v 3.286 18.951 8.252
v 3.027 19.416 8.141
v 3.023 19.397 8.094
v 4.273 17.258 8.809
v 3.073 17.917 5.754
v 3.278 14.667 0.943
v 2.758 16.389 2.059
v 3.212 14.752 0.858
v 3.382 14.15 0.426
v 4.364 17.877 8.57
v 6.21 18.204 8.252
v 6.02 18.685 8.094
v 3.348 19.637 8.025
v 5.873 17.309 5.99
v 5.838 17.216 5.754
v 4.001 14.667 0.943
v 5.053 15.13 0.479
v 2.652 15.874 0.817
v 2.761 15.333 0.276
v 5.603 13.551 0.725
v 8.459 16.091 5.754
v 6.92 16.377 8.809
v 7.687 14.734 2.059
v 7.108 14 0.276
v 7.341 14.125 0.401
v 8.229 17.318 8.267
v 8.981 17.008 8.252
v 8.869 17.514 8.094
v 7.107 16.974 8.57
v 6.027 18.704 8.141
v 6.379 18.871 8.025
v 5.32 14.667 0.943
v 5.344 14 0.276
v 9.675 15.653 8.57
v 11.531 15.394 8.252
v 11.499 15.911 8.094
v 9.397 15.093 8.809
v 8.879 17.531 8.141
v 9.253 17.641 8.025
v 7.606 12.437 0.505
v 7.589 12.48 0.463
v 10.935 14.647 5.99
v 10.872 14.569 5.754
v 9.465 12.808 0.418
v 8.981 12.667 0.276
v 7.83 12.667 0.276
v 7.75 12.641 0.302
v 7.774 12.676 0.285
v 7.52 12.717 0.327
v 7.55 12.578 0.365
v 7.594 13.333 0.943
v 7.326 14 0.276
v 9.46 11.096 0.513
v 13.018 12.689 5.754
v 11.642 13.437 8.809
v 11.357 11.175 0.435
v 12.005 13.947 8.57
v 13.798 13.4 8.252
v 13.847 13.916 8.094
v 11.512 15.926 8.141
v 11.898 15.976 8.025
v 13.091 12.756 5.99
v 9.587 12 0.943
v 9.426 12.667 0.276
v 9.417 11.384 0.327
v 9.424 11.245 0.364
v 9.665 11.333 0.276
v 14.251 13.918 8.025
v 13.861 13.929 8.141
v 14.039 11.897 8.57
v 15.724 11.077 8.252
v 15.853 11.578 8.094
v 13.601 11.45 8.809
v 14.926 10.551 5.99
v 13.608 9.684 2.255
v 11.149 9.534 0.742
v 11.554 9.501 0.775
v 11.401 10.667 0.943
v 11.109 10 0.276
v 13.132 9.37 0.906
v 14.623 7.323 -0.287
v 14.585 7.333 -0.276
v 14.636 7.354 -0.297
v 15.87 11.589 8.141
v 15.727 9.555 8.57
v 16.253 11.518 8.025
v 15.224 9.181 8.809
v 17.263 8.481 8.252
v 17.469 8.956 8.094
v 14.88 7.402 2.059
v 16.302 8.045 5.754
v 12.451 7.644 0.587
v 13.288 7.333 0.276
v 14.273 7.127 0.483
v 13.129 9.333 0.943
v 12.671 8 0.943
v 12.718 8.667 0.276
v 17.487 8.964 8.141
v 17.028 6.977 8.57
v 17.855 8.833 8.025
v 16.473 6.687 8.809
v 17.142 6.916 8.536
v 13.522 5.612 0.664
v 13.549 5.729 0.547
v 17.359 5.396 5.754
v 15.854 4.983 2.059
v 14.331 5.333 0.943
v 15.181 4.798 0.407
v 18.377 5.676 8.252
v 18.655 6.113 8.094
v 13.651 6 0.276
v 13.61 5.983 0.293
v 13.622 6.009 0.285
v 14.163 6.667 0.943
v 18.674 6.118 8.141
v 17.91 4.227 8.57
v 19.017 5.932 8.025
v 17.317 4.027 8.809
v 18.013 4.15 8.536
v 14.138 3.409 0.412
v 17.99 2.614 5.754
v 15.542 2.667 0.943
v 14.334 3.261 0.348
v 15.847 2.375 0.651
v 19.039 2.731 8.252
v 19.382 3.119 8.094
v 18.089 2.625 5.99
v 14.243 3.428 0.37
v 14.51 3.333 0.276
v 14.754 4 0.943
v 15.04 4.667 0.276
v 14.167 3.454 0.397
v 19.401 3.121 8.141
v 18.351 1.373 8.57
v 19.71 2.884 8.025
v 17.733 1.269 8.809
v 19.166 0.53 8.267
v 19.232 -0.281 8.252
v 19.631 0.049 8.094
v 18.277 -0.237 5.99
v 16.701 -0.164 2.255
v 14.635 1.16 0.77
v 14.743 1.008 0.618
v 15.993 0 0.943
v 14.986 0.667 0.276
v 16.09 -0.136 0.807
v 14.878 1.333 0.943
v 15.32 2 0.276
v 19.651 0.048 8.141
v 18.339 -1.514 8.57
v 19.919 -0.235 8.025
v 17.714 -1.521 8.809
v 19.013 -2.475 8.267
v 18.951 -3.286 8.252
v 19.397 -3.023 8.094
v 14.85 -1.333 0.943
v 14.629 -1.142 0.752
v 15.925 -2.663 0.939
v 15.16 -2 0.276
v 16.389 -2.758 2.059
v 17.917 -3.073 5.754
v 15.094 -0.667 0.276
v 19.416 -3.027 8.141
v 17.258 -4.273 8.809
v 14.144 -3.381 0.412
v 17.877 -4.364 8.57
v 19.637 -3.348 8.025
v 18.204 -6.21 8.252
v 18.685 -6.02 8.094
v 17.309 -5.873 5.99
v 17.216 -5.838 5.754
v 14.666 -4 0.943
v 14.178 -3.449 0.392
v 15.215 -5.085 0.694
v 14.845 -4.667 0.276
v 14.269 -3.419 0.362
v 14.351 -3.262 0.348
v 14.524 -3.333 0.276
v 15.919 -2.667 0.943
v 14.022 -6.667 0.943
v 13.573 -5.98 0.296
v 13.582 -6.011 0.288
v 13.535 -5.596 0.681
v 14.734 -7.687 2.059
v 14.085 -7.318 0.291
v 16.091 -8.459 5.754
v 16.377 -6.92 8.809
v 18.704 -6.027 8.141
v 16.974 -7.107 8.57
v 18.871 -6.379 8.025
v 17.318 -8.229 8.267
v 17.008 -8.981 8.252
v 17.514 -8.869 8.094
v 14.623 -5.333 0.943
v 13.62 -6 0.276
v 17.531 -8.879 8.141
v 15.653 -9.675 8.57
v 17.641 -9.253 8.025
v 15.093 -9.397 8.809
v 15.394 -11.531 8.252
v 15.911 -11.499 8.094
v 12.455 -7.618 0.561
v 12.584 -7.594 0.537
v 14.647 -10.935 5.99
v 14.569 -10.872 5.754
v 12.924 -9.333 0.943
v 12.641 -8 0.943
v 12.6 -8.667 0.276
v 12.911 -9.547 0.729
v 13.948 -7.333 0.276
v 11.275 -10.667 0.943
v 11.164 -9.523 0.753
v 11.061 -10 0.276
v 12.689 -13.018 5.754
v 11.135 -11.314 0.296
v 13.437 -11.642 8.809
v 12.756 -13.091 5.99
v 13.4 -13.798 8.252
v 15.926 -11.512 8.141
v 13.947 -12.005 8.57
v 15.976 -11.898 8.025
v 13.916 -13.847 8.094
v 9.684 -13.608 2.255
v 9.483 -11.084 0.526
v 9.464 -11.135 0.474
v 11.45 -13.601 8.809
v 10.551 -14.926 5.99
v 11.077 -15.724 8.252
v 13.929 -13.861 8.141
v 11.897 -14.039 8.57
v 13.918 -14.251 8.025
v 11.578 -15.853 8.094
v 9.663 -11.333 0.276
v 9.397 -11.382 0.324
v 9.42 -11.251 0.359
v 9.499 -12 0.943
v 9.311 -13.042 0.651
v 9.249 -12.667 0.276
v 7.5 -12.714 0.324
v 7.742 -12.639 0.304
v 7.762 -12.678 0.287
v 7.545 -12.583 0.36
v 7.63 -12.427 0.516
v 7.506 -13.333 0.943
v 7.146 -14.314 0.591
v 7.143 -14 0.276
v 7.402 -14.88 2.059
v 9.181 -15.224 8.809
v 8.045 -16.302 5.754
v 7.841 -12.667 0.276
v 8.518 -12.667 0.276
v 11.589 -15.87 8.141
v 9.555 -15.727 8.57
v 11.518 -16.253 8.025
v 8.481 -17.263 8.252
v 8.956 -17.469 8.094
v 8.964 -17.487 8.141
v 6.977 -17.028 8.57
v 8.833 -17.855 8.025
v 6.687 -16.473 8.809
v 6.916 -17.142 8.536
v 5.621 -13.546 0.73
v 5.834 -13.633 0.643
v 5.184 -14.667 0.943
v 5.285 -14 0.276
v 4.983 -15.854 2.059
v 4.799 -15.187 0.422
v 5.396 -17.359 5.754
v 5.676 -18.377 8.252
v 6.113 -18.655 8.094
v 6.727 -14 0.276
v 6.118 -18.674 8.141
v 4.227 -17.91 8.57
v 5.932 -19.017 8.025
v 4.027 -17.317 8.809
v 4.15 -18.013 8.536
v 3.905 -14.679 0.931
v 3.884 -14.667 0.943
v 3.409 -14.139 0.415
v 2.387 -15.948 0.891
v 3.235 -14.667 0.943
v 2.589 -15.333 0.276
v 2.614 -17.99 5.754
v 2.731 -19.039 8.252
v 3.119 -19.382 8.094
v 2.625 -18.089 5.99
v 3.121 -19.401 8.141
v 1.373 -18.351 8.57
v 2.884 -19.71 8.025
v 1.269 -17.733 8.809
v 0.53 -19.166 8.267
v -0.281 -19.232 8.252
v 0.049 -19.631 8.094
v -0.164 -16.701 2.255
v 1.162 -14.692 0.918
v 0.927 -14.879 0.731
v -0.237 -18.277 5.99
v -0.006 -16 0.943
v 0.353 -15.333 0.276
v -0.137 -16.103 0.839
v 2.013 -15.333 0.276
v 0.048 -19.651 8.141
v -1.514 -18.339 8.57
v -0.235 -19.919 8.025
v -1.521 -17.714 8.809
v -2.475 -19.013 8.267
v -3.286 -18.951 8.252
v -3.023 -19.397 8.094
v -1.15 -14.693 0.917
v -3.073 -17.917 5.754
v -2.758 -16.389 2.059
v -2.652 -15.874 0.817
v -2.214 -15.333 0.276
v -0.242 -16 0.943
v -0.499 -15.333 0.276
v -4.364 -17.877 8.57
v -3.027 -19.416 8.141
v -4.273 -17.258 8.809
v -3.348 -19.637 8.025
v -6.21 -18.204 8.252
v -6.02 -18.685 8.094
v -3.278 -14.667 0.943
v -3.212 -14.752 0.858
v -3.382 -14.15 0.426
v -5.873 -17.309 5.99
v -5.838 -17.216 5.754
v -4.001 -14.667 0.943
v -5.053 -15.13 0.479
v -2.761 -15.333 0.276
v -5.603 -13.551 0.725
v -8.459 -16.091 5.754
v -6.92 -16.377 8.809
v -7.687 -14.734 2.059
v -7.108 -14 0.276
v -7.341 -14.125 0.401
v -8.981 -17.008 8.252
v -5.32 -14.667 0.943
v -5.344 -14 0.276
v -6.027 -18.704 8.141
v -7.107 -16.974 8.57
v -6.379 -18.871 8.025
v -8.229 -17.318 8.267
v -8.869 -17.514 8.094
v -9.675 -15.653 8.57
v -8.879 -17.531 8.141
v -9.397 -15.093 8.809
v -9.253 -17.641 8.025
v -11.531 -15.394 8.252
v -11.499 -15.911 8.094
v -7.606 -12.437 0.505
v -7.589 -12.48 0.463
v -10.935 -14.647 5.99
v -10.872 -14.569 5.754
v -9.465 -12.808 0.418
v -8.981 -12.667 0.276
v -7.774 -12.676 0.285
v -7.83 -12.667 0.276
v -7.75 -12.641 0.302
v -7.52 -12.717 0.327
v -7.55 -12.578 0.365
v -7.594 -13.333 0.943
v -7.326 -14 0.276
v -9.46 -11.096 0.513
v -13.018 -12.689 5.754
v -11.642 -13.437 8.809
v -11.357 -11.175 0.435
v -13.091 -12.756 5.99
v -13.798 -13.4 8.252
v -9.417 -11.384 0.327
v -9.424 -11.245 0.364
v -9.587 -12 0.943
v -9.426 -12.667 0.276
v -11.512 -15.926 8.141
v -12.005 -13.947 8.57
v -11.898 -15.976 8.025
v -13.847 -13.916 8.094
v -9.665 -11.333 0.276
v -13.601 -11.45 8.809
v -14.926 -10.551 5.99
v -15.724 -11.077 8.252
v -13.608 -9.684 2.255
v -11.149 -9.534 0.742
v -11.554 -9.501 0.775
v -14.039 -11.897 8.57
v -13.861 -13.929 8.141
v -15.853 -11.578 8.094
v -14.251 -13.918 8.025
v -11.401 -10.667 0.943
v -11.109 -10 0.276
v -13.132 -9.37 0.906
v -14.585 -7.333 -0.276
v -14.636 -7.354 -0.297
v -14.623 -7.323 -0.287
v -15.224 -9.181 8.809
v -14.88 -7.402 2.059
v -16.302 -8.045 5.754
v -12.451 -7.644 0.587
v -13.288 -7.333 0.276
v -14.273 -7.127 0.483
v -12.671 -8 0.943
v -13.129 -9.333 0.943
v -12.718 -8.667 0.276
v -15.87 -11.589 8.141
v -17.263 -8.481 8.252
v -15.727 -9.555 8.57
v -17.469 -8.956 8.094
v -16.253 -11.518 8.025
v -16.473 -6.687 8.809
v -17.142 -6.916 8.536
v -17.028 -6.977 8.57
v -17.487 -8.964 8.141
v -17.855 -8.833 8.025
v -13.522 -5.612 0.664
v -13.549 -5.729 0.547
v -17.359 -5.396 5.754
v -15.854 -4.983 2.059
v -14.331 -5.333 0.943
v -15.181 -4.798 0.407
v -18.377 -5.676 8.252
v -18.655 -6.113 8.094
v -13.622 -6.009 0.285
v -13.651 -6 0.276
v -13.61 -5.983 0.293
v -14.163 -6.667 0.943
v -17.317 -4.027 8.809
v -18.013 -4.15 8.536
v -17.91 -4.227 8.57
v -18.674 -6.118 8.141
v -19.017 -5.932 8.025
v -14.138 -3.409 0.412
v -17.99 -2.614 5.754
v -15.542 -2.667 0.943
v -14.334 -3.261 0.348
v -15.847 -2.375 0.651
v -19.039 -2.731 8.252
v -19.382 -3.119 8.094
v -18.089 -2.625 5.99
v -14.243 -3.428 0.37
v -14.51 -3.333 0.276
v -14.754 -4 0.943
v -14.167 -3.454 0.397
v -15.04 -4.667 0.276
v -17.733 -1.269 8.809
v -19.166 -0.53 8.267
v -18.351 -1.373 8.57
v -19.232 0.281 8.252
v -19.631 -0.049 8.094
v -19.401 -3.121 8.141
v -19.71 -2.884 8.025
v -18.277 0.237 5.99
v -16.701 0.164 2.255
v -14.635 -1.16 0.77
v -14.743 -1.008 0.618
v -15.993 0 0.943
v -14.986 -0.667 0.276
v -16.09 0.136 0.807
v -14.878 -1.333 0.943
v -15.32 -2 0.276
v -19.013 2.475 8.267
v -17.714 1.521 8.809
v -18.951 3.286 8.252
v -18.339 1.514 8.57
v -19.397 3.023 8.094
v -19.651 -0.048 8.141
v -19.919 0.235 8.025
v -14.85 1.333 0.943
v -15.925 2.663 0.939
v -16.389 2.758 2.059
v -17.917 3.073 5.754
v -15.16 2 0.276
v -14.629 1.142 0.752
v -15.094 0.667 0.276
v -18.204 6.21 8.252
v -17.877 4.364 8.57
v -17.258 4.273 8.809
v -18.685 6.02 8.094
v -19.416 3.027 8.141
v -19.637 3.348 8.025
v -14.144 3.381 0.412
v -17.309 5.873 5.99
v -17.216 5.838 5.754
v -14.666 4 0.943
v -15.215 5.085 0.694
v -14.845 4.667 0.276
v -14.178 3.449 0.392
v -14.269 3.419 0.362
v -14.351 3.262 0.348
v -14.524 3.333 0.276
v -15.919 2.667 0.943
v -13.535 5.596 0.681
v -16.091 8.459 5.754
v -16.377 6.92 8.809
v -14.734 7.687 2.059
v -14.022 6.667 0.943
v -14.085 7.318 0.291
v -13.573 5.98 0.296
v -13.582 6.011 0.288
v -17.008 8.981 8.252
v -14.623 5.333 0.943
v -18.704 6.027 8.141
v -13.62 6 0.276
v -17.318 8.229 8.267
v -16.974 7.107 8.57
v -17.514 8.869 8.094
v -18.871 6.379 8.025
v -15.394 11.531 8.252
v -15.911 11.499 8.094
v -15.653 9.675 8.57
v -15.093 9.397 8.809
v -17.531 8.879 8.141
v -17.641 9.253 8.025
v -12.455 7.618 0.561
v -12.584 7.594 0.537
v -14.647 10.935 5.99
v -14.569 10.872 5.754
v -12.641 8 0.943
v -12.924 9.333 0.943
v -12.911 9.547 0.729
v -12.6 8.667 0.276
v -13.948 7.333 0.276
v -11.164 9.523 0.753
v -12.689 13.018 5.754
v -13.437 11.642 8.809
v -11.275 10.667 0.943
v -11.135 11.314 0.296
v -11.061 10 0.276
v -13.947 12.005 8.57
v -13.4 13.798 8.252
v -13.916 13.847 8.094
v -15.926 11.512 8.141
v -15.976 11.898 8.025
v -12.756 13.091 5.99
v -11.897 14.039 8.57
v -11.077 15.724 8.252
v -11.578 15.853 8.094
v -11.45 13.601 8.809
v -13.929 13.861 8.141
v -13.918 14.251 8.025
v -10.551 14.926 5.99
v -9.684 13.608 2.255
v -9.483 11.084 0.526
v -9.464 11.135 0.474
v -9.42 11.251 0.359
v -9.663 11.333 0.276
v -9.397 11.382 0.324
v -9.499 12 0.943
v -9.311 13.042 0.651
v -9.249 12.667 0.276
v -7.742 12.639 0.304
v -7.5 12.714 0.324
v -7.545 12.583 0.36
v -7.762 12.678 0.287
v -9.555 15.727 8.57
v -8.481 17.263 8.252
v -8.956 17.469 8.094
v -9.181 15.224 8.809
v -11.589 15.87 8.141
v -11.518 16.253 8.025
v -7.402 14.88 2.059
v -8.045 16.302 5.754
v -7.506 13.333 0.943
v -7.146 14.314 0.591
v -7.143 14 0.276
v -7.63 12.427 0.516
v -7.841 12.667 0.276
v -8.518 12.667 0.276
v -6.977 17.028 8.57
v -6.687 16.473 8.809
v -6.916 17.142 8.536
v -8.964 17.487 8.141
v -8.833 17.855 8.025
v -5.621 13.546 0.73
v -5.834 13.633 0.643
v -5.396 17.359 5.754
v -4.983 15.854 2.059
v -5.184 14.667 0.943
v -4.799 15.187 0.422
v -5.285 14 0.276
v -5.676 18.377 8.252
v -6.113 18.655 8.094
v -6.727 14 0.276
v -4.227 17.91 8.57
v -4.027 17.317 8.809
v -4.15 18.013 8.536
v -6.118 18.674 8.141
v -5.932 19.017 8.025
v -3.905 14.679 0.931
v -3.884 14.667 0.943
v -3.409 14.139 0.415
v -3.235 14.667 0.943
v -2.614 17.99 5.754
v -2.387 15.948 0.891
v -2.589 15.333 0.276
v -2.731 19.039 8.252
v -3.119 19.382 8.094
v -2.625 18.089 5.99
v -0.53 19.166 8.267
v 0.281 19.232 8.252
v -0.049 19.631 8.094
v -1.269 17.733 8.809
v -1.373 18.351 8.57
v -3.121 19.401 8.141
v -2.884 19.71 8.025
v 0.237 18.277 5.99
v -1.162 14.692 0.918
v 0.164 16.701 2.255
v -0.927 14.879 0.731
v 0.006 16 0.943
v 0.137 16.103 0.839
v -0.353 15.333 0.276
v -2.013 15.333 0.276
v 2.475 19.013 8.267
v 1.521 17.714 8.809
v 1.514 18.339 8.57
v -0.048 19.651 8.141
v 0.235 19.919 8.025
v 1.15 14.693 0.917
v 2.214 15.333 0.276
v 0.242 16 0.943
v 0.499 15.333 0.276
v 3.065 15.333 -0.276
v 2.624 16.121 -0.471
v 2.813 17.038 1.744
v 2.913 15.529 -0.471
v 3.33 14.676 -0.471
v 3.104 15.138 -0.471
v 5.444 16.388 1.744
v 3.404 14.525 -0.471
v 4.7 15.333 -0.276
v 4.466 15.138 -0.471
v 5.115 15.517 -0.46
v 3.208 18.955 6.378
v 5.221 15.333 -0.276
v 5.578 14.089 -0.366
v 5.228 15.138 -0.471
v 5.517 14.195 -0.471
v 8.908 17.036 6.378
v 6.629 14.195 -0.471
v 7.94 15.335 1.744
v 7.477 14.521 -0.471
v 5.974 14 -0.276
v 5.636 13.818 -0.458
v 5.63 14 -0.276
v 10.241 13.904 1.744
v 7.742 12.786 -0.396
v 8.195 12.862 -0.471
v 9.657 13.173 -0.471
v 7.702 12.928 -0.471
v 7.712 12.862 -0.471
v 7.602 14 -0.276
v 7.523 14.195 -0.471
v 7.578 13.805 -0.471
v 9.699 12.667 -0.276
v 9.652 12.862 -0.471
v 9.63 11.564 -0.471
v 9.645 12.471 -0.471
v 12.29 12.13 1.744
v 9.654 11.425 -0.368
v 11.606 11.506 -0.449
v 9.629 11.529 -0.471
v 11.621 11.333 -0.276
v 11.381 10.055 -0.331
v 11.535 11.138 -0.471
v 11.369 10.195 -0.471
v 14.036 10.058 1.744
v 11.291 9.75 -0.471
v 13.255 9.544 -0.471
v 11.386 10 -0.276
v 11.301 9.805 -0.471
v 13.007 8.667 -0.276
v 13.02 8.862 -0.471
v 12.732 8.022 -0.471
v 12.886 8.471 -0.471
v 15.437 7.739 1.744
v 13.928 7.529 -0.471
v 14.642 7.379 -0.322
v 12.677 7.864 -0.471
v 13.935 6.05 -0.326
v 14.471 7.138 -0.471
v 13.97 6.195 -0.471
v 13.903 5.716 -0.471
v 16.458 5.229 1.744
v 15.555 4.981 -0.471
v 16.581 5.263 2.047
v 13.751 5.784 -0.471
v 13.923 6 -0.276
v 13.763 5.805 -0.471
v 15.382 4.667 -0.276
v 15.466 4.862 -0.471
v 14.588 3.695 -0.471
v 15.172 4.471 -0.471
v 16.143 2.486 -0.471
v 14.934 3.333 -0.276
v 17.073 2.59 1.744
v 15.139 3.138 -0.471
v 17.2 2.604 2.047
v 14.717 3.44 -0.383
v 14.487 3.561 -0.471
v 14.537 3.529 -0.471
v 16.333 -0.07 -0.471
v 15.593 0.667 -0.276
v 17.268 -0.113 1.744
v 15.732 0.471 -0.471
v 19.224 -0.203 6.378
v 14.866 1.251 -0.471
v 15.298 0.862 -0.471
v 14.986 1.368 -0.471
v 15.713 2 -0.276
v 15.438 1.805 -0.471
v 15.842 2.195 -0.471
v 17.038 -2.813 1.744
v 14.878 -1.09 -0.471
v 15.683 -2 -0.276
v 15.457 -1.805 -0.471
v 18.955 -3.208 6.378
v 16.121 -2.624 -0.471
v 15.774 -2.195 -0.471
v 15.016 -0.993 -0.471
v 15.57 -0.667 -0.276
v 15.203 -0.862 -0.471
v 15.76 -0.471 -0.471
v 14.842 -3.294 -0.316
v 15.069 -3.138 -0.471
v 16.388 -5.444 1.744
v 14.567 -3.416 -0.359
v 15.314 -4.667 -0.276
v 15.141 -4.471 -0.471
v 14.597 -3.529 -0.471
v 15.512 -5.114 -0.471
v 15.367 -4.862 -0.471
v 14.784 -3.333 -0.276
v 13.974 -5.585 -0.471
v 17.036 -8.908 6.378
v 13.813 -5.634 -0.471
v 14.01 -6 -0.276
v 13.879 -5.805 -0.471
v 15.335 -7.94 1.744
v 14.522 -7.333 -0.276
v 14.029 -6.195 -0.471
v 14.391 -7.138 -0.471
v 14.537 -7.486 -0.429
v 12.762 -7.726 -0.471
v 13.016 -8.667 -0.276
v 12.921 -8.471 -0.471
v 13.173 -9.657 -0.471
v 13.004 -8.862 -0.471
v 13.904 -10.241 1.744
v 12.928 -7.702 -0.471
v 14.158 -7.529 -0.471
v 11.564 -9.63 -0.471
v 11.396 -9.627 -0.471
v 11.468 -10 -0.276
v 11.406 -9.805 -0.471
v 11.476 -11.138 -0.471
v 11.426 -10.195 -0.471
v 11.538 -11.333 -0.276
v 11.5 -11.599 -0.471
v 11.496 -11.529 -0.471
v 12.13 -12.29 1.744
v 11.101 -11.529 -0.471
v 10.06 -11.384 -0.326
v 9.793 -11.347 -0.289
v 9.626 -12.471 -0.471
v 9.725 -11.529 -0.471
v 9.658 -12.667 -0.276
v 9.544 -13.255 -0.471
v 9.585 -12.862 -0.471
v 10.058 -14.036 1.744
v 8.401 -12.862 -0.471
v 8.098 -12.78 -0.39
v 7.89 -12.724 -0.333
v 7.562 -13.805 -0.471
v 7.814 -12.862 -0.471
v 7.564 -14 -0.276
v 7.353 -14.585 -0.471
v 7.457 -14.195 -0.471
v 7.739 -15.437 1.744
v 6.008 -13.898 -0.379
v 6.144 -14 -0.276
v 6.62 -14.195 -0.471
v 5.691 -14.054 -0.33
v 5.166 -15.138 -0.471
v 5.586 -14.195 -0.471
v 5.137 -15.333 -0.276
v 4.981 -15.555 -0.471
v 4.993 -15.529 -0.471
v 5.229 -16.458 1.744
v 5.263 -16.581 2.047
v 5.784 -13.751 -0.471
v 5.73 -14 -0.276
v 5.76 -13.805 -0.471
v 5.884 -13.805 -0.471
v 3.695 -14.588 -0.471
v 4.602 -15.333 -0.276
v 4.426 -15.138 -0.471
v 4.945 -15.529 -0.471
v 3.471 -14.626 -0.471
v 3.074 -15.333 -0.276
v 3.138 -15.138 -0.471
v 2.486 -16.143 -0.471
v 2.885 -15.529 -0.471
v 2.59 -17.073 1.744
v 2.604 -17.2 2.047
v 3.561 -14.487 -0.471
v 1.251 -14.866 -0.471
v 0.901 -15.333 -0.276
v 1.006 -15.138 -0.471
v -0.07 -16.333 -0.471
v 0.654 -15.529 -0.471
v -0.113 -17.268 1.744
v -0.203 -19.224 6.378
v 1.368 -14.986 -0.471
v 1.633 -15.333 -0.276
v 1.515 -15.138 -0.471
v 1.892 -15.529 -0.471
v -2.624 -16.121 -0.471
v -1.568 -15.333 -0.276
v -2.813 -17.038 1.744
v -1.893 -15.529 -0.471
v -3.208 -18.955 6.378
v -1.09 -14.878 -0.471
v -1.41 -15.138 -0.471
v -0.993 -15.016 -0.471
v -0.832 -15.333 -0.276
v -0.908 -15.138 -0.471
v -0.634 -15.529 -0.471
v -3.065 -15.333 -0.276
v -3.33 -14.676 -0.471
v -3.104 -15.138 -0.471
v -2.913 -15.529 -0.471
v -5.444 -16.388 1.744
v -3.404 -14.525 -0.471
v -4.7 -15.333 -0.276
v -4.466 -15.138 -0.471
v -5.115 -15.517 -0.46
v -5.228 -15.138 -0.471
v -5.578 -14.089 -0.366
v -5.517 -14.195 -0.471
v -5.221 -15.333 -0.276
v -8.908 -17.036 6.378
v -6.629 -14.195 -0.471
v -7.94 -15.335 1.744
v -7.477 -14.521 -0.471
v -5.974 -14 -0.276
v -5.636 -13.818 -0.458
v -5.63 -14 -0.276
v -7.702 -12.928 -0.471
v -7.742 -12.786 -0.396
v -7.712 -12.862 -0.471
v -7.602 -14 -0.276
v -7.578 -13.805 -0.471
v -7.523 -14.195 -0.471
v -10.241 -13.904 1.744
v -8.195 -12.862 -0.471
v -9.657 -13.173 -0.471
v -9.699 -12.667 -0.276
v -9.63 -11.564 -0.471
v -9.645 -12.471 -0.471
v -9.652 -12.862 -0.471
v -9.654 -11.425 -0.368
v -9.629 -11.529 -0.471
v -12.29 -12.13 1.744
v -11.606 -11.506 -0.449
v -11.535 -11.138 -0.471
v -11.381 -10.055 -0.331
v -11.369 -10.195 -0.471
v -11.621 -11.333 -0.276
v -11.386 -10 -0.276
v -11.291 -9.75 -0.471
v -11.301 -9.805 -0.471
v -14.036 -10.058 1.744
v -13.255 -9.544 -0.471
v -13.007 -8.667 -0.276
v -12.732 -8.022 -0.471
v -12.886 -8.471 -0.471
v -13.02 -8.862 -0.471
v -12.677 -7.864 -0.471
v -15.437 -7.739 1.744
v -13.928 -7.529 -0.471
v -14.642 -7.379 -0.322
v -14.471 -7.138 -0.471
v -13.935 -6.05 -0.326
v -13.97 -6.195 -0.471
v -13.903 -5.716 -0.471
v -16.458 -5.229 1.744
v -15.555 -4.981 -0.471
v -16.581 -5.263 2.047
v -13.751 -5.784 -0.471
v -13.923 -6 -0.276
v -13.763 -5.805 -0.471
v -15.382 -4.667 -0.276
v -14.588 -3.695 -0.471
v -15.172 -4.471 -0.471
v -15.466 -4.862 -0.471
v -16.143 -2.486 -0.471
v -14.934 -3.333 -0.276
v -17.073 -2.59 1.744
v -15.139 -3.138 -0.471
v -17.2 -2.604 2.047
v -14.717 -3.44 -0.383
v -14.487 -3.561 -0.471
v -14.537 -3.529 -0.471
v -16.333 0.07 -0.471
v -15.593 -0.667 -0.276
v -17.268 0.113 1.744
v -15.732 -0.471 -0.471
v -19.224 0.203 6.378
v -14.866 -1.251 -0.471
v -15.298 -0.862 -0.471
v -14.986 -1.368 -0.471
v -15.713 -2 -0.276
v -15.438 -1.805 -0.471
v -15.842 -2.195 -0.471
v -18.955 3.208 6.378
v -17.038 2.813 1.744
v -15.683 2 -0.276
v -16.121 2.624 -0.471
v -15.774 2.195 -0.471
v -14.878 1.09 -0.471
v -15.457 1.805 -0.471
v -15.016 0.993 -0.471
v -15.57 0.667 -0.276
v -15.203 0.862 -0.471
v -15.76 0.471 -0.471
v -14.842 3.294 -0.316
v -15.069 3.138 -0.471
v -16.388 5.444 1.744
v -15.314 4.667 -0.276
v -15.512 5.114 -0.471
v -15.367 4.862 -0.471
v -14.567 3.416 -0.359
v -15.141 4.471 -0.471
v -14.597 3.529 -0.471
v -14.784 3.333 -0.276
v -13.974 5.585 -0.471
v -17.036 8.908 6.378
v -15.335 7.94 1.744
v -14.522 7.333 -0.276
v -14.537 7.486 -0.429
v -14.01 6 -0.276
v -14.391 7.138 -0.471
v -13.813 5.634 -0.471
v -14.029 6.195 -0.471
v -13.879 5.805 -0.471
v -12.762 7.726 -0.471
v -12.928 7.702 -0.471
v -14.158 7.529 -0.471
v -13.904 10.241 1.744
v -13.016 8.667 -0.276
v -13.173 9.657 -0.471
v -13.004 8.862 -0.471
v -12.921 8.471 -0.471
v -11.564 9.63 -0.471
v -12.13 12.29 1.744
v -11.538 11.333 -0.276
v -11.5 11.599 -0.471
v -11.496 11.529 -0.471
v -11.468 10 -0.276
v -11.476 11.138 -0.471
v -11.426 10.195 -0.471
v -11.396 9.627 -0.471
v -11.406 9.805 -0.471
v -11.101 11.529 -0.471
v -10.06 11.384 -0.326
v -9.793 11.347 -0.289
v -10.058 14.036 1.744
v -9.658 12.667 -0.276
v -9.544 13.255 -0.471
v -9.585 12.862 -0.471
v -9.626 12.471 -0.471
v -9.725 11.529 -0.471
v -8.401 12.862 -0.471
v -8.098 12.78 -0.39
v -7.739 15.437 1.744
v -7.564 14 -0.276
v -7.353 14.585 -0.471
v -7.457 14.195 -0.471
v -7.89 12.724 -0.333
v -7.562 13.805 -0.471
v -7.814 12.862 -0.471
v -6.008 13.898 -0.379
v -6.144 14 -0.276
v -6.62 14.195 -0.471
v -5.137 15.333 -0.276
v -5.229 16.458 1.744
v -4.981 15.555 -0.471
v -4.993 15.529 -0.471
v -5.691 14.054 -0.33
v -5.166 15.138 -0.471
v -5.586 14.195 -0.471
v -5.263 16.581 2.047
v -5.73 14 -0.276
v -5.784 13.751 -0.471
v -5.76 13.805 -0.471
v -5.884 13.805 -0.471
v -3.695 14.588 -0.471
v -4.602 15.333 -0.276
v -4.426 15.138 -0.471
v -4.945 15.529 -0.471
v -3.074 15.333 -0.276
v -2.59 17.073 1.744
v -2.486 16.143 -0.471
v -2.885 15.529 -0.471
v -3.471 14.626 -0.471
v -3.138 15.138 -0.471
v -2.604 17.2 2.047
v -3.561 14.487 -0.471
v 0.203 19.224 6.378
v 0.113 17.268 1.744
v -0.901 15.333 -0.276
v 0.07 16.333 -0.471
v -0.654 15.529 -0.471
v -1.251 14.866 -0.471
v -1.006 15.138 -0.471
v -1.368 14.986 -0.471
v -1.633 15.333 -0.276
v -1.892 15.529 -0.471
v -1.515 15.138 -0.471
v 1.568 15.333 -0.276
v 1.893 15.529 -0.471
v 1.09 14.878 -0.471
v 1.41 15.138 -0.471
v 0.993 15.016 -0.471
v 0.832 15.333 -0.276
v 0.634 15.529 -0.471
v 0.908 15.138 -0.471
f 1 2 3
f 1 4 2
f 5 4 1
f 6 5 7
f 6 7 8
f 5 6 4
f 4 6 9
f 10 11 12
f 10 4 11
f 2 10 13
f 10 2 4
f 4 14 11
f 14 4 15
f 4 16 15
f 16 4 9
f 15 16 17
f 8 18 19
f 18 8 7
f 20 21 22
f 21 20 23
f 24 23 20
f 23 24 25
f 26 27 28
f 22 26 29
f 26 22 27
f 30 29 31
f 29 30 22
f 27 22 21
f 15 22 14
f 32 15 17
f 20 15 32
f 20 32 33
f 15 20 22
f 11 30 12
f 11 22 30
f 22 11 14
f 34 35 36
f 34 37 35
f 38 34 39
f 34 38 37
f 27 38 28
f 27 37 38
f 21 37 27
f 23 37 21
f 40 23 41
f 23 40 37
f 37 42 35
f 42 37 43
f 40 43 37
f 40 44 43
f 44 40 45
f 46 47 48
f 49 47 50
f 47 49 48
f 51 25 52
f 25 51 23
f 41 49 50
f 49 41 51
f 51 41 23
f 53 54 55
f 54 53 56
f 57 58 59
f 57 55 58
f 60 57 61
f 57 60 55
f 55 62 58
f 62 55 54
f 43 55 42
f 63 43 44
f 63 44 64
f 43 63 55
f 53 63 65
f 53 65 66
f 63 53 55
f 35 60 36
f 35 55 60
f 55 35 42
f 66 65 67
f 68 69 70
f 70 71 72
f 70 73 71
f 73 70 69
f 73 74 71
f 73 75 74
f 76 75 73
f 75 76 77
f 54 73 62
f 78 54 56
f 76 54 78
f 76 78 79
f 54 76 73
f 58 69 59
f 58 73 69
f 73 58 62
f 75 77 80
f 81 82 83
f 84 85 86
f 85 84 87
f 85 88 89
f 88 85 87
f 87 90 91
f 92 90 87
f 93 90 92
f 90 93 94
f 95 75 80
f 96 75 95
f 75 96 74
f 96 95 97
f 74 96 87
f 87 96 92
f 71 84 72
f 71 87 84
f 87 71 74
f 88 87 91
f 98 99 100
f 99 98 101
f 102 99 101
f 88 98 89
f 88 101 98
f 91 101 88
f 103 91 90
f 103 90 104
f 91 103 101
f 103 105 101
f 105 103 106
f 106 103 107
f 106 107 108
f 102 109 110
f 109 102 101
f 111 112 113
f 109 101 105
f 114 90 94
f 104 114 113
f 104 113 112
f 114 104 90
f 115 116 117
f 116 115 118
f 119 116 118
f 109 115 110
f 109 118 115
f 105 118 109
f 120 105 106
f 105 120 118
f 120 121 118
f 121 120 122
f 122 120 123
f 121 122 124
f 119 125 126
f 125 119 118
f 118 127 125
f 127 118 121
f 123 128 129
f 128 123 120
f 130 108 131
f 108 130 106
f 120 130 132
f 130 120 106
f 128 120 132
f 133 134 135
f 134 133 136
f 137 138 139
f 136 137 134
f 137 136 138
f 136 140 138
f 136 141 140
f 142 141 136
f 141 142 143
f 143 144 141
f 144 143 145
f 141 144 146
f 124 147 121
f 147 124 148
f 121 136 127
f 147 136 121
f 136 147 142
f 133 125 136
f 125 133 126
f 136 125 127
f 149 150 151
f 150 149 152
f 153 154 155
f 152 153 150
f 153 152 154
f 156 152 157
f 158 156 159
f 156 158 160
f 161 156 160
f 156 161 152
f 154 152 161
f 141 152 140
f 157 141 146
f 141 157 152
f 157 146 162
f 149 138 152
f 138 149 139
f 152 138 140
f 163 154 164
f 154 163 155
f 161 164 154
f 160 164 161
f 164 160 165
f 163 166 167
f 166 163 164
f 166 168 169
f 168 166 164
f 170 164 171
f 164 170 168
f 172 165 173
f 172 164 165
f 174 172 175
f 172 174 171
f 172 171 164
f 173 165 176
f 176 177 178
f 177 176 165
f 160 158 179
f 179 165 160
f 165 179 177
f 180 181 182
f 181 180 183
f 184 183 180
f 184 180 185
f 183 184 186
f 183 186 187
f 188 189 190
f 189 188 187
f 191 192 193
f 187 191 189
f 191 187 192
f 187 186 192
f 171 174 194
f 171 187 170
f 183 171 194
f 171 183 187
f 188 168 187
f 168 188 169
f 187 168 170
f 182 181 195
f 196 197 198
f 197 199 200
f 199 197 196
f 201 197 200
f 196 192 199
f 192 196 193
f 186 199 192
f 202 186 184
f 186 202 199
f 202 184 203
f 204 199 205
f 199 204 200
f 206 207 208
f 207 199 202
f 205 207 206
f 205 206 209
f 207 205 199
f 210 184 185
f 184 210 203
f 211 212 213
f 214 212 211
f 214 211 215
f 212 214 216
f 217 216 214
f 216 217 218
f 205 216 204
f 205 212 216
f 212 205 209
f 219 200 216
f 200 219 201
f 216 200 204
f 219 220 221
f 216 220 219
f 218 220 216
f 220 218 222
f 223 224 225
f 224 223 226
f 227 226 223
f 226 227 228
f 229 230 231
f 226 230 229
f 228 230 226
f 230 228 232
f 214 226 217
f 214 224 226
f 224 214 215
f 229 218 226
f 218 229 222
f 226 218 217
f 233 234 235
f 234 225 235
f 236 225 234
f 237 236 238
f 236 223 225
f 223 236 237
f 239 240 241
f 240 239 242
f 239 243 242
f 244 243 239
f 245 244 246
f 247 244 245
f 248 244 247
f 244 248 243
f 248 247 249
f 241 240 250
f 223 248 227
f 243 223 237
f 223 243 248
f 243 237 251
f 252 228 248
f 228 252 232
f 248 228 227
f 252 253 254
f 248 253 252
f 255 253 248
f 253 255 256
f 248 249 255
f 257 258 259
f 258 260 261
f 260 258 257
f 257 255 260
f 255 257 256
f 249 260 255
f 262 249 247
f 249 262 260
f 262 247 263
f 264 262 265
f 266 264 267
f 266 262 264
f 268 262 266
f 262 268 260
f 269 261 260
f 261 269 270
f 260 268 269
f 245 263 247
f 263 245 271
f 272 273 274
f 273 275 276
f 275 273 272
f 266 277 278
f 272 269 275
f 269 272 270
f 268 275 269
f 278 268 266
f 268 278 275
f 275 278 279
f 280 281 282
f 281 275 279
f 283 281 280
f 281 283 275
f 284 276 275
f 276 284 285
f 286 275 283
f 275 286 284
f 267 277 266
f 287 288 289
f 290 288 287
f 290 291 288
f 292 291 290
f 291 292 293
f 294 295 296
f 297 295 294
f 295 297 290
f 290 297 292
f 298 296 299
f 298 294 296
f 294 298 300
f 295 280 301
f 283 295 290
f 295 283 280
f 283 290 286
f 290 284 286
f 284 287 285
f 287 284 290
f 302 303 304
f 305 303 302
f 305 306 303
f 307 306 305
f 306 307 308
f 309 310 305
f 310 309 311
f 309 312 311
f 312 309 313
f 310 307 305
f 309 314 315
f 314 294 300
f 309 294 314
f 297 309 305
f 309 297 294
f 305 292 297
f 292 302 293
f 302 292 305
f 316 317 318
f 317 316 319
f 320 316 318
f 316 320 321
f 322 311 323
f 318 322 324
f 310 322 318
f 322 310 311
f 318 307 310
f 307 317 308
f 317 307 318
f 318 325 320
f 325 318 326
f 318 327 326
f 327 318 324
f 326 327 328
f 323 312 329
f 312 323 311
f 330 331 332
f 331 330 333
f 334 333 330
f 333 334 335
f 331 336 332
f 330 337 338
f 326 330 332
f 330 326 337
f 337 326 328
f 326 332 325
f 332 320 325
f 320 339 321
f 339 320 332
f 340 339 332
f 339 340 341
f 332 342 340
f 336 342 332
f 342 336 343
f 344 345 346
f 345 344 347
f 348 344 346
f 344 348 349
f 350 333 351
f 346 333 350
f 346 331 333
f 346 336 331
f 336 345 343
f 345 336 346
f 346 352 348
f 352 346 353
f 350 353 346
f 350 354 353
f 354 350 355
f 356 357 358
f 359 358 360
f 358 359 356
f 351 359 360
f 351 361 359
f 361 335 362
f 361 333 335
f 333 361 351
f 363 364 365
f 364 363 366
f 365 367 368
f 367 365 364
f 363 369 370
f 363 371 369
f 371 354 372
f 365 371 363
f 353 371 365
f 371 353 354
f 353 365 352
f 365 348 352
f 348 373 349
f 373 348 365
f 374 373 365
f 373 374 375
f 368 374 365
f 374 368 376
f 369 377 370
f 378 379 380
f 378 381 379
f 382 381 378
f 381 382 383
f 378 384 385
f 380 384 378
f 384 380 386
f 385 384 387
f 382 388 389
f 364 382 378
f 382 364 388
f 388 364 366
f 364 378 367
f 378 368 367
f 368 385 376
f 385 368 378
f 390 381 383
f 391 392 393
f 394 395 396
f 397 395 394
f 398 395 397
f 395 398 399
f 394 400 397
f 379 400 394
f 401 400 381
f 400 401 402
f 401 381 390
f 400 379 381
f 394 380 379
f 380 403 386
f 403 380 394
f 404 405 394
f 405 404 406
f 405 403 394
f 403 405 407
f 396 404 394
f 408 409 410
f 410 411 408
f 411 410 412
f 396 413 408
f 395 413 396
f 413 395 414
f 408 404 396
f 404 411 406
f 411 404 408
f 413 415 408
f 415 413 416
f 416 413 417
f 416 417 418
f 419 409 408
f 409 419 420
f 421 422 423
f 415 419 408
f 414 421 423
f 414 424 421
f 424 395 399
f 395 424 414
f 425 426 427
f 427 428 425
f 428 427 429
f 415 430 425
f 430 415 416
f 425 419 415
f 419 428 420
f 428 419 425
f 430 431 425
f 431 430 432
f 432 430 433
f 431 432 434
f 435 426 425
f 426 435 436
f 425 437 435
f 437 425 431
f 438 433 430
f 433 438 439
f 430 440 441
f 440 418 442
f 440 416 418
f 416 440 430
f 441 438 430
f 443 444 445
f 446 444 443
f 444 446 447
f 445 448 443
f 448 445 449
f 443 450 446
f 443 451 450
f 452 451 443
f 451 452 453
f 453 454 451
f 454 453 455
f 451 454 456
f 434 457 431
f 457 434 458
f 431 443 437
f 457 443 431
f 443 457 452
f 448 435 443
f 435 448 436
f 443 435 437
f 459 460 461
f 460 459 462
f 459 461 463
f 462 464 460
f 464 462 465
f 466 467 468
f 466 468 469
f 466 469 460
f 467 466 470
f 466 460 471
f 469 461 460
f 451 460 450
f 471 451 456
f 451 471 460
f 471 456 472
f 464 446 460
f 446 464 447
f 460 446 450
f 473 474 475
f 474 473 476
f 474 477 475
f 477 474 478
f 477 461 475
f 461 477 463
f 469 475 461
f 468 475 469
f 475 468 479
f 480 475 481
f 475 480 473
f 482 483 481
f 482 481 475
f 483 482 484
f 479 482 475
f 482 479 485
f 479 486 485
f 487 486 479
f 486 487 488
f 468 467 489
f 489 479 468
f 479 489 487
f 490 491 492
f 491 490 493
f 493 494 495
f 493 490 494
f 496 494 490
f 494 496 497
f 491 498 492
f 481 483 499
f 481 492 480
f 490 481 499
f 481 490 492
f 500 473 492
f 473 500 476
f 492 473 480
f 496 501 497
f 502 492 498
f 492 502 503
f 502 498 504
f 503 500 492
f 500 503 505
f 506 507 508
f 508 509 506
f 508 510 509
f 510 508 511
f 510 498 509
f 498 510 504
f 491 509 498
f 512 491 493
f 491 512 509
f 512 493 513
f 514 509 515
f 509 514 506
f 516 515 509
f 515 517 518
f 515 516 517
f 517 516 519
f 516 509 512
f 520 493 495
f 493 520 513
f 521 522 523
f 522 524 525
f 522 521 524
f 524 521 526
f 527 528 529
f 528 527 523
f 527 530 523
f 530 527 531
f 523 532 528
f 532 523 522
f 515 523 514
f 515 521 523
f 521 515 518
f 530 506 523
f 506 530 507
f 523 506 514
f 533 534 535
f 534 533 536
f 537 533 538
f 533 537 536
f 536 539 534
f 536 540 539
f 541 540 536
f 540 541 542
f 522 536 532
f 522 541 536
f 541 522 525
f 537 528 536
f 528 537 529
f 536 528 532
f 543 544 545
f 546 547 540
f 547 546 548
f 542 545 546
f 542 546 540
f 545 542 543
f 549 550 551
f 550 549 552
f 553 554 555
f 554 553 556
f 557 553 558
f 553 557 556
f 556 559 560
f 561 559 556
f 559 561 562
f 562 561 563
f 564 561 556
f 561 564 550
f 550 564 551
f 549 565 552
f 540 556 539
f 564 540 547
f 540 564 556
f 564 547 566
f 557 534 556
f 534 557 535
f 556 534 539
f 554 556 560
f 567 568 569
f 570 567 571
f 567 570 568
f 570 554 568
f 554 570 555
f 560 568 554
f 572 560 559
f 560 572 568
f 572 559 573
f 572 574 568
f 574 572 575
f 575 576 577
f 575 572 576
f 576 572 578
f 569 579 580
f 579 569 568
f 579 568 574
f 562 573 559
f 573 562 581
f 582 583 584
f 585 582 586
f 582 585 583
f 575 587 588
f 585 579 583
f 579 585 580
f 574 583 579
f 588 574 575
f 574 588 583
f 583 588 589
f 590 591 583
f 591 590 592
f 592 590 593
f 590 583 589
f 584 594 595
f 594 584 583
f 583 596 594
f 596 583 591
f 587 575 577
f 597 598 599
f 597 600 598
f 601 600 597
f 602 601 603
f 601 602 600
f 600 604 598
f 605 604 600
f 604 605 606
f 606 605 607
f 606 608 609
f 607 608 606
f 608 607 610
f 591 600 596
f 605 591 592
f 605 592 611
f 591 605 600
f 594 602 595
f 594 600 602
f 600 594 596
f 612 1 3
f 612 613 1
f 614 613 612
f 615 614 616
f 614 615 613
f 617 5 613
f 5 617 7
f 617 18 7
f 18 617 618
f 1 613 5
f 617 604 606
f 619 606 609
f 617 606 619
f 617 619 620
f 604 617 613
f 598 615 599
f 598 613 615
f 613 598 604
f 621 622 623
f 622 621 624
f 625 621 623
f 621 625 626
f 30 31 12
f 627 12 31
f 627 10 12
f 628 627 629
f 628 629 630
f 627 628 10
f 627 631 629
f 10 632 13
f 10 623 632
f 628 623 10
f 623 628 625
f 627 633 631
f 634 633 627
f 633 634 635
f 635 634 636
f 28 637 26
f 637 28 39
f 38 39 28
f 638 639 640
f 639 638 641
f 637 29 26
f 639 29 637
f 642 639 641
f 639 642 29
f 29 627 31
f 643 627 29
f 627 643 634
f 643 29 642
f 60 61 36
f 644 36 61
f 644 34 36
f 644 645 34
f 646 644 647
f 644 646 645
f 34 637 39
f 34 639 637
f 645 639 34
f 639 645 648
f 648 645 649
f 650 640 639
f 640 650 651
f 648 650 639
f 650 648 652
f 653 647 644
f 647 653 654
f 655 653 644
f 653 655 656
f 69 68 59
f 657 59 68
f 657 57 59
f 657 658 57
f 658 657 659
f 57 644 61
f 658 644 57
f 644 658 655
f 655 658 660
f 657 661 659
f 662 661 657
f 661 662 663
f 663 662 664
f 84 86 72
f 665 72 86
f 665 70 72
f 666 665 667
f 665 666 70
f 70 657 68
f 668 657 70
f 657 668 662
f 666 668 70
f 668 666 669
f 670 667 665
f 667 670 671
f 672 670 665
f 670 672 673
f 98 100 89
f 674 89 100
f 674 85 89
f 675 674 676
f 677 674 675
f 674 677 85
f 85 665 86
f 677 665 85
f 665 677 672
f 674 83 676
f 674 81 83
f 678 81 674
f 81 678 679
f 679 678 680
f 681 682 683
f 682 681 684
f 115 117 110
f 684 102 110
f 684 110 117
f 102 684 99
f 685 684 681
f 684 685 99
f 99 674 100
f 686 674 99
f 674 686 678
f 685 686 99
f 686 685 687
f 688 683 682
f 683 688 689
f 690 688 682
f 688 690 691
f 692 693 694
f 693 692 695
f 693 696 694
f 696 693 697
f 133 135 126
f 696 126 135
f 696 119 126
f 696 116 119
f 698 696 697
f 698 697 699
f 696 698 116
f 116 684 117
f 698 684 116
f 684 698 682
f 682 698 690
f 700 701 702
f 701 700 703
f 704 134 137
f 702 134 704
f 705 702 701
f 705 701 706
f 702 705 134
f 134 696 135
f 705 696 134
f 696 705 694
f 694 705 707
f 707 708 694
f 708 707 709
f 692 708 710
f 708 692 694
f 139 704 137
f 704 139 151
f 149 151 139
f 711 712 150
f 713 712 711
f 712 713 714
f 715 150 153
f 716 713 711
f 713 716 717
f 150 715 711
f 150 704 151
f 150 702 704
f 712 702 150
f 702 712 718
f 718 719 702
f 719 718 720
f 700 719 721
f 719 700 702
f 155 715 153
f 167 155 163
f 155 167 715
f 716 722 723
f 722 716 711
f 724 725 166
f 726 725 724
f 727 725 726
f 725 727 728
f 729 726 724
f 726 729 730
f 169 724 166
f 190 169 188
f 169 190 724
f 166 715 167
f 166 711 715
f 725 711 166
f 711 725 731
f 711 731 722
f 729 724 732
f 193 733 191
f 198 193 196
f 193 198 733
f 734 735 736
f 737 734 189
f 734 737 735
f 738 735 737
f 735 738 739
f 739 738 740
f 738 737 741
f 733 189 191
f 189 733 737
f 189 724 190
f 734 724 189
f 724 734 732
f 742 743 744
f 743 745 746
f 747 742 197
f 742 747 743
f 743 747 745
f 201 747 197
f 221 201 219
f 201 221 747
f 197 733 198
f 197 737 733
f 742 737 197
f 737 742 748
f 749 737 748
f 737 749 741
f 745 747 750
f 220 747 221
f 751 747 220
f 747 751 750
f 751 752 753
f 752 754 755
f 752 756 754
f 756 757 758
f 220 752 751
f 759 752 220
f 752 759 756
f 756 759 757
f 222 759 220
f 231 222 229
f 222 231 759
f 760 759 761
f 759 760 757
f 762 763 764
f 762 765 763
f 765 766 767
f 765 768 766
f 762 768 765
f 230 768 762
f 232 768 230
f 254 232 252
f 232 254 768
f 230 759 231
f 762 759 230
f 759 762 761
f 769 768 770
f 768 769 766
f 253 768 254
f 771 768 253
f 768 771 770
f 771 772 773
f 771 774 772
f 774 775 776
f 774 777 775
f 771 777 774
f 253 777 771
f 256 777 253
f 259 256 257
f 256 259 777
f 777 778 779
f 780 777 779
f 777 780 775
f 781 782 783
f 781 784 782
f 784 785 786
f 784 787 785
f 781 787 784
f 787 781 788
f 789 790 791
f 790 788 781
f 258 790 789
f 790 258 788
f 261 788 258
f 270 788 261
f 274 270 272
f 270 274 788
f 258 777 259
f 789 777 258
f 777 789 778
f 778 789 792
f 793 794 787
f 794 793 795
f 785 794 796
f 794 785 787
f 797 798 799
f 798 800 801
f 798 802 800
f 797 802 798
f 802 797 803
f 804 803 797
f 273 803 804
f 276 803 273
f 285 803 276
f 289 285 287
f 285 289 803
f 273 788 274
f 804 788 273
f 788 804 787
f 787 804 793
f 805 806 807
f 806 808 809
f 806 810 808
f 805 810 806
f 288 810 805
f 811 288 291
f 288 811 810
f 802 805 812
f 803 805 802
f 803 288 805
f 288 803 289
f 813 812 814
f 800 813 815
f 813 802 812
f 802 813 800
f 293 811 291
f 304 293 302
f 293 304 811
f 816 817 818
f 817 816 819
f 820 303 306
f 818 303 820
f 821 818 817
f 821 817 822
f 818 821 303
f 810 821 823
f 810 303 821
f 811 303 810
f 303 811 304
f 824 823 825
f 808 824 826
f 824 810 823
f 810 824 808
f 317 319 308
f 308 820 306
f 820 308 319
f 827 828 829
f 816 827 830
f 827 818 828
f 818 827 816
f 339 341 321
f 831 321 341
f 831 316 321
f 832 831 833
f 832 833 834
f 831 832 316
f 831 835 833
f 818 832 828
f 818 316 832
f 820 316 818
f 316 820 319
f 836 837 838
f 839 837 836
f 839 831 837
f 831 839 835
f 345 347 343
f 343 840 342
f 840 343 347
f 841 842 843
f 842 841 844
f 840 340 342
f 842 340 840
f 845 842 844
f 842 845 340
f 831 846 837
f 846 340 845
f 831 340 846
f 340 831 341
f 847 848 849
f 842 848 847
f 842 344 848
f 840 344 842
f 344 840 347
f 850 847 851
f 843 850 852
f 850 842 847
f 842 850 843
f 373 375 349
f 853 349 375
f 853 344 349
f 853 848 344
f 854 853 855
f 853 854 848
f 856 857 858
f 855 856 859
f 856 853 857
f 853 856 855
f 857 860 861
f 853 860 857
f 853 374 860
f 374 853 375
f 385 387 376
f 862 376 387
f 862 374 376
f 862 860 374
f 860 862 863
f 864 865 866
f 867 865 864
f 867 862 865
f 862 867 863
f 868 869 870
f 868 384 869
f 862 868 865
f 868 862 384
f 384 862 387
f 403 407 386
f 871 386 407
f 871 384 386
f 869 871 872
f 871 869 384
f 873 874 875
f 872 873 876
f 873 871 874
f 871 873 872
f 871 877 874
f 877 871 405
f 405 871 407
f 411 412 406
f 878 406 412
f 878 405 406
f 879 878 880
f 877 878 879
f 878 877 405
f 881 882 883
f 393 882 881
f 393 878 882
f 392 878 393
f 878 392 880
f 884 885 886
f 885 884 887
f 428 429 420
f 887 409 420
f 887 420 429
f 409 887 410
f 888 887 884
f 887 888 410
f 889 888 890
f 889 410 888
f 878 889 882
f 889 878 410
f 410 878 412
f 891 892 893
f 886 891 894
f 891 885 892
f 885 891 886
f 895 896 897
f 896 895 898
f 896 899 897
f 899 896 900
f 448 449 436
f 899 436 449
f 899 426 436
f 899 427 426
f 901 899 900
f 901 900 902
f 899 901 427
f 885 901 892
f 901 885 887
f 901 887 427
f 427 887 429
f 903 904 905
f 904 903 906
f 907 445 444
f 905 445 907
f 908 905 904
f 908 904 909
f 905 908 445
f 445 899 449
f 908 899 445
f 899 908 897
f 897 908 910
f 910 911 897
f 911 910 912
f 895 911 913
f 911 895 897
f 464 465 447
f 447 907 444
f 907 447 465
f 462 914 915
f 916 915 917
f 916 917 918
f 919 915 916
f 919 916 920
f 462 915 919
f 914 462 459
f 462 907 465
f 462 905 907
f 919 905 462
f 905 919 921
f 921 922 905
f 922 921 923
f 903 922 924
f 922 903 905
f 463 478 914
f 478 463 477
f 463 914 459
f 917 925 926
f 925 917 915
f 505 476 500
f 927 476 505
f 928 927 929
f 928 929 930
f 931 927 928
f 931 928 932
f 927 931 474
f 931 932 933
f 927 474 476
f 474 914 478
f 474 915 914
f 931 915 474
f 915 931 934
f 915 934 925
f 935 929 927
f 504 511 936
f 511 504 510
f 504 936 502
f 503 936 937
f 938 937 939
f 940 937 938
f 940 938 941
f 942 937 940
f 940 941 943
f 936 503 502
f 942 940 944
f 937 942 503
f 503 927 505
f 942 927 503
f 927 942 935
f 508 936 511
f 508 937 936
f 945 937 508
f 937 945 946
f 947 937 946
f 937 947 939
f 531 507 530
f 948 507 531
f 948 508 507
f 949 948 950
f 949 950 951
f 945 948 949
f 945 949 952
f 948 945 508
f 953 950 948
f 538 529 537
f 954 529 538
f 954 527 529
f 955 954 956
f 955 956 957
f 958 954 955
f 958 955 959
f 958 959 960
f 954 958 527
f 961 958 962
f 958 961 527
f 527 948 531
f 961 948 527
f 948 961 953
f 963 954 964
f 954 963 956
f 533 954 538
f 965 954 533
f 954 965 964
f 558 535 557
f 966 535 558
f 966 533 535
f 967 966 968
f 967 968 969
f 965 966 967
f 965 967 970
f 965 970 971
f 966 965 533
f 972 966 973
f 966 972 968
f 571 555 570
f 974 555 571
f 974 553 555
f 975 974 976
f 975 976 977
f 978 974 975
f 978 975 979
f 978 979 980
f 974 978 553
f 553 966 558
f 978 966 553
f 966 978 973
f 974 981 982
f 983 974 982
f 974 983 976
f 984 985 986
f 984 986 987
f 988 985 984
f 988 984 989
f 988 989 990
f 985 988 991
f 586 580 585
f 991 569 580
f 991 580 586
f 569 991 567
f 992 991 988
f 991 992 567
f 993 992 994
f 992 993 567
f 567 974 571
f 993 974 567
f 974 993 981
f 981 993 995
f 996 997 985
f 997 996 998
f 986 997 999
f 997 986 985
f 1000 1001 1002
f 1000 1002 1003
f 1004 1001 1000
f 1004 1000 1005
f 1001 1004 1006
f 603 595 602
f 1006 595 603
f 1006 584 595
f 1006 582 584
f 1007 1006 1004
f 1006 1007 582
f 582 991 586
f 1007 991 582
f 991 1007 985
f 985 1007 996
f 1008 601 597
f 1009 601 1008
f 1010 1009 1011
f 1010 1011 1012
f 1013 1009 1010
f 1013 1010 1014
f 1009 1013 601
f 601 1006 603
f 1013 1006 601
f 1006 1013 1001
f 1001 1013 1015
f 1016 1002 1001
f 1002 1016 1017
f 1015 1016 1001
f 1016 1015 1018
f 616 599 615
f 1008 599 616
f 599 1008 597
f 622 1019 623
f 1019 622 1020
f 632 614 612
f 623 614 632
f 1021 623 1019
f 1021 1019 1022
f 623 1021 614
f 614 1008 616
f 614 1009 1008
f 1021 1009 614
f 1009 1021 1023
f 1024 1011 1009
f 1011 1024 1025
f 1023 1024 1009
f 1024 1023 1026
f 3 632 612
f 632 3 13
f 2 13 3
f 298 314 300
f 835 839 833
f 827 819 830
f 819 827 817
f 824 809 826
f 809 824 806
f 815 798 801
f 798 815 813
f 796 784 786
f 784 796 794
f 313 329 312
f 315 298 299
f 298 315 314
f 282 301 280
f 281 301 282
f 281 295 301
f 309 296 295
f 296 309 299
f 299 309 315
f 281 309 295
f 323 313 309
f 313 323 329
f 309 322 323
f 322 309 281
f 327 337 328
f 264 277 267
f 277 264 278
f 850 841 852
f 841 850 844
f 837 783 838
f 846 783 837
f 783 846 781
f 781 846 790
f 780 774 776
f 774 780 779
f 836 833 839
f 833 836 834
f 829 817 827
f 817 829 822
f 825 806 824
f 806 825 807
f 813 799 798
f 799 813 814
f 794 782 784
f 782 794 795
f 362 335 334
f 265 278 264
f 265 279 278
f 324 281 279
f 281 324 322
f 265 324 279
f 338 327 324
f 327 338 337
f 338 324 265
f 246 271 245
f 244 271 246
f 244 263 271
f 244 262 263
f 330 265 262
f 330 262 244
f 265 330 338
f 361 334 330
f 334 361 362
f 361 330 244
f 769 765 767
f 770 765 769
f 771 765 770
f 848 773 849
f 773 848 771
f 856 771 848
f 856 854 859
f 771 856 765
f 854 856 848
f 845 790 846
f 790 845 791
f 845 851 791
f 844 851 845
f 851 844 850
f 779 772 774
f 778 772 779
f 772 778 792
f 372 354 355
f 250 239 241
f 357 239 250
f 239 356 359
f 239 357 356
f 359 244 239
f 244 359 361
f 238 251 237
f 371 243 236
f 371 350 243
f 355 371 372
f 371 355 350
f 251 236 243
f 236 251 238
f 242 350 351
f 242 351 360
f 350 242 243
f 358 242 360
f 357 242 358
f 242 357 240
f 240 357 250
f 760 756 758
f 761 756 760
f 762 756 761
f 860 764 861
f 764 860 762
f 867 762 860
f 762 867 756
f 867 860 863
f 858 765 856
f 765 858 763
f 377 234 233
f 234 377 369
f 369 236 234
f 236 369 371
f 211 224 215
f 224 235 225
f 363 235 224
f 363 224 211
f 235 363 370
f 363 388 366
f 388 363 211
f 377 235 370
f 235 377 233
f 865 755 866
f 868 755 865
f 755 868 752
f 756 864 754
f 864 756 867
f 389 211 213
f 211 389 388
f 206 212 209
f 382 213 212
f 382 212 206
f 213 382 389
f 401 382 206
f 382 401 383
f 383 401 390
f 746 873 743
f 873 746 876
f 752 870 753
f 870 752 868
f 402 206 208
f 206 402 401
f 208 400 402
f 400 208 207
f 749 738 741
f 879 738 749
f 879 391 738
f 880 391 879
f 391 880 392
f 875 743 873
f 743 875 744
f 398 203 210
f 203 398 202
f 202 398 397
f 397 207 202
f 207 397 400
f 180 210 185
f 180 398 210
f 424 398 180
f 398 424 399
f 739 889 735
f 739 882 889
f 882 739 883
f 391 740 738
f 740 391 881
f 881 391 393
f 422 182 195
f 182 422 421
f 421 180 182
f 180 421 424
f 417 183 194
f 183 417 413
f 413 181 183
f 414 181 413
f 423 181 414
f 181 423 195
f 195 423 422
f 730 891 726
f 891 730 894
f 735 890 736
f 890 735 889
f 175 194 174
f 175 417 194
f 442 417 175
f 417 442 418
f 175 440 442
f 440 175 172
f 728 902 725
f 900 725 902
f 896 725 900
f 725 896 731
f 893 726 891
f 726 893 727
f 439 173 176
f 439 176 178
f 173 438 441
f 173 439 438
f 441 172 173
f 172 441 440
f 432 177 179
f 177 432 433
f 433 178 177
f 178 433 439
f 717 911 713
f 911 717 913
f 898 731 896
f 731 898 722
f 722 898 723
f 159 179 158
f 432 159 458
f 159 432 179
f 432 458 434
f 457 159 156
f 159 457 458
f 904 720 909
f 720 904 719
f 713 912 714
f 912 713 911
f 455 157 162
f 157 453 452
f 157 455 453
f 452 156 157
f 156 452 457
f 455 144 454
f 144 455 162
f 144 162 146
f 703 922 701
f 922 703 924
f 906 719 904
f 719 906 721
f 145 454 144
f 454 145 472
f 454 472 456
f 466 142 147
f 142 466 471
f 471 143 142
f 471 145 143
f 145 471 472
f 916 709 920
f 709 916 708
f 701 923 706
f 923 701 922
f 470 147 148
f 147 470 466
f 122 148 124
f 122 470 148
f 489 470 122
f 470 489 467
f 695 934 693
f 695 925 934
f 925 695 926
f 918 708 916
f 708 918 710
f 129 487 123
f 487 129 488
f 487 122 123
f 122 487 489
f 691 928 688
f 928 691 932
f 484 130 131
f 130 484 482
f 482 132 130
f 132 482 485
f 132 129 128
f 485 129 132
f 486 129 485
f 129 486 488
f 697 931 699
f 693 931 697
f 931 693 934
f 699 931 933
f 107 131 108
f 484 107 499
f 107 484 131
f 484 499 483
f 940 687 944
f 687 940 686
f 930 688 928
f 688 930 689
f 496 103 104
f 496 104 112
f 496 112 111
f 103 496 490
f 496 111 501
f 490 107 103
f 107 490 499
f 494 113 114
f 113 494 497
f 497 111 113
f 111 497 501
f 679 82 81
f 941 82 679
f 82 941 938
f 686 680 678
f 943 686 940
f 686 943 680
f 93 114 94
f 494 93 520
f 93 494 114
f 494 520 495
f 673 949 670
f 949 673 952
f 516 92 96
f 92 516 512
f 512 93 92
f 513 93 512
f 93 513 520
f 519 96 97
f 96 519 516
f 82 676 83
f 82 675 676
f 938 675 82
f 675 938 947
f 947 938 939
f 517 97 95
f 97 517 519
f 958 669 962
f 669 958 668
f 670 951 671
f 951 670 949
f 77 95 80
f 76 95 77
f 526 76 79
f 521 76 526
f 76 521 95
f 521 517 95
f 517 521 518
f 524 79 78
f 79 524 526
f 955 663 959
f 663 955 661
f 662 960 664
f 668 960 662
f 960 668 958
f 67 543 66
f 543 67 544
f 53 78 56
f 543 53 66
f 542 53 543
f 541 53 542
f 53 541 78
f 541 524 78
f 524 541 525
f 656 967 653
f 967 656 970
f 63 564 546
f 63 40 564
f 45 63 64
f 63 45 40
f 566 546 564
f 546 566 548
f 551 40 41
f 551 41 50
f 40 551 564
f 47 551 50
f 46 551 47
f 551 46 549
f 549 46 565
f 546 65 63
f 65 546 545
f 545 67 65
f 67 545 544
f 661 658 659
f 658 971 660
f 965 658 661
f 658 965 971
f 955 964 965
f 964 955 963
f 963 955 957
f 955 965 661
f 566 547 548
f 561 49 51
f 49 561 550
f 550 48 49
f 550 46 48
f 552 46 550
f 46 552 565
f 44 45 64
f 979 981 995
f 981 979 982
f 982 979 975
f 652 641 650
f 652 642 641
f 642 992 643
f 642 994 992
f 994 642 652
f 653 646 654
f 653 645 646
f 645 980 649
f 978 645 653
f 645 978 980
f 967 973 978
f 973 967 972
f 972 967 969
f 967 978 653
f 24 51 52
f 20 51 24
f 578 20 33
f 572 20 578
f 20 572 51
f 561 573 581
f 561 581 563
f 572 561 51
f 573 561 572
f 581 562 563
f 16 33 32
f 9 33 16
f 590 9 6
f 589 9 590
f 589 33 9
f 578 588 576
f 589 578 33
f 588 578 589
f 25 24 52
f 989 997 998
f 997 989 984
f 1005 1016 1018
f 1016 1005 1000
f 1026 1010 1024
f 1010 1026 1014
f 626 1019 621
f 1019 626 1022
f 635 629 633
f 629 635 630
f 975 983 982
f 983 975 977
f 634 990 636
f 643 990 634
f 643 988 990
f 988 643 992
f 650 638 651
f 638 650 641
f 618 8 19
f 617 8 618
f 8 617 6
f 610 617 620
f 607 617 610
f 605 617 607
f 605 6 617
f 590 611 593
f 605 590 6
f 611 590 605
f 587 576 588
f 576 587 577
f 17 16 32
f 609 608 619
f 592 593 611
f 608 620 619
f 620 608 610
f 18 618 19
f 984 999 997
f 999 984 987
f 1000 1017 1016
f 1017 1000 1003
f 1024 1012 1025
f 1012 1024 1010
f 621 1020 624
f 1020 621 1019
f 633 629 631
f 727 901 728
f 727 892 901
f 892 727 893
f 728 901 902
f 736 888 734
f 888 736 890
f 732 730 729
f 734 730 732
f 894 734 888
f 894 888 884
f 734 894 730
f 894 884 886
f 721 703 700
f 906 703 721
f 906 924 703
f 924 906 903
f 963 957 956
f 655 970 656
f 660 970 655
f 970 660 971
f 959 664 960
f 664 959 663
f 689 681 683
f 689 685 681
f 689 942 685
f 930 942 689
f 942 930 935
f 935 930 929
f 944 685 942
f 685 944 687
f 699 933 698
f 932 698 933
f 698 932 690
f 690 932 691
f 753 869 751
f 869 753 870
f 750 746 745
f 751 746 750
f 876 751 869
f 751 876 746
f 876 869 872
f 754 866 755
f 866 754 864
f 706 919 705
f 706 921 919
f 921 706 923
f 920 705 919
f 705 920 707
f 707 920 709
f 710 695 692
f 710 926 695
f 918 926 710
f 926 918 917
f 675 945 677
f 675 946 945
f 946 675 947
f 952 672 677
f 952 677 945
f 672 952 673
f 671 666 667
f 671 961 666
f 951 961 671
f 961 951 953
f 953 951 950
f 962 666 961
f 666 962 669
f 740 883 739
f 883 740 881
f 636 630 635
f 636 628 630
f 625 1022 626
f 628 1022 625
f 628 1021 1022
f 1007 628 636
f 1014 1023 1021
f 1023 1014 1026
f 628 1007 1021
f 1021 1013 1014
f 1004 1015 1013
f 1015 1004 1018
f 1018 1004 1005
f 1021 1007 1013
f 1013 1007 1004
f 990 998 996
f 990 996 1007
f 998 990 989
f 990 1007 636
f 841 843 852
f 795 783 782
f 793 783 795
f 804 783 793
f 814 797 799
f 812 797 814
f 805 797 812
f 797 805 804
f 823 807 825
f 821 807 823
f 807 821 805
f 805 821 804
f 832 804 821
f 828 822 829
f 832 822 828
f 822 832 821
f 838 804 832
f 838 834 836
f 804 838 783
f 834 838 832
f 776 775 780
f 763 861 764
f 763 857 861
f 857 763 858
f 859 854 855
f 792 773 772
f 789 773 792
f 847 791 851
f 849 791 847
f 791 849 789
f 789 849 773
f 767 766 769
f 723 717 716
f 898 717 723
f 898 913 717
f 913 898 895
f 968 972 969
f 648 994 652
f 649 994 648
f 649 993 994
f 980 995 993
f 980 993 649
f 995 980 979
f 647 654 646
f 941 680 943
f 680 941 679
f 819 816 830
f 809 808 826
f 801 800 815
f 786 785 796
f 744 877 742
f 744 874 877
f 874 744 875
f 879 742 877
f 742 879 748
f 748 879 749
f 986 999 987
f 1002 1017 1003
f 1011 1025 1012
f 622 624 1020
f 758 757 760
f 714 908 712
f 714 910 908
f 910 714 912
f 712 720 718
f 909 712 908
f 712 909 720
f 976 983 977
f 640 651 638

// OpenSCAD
r = 20;   // hankei
d = 0.3;  // astumi
n =  30;  // ca. n of teimen
n2 = 40;  // n of sokumen
namiw=2*r/n;
h=namiw/1.4142;

module plate(){
	translate([0,0,-h])
	cube([r*4,r*4,h],center=true);
}

module nami(){
  for(t=[-r:namiw:r]){
	translate([0,t,0])
	rotate([45,0,0]){
	    cube([r*2,namiw,namiw],center=true);
    }
   }
}

module nami_plate(){
	difference(){
		nami();
		plate();
    }
}

module inner(){
	for(t=[0:360/n2:360]){
		translate([r*sin(t),r*cos(t),-1.4])
		rotate(-t-60){
			rotate([-15,-15,-0])
			cube([7,7,9]);
		}
	}
}

module outer(){
	for(t=[0:360/n2:360]){
		translate([(r+d)*sin(t),(r+d)*cos(t),-2.5])
			rotate(-t-60){
			rotate([-15,-15,-0])
			cube([7,7,12]);
		}
	}
    // gomitori
	translate([-r,-r,0])
		cylinder(r=r/2,h=5,center=true);
	translate([r,-r,0])
		cylinder(r=r/2,h=5,center=true);
	translate([-r,r,0])
		cylinder(r=r/2,h=5,center=true);
	translate([r,r,0])
		cylinder(r=r/2,h=5,center=true);
}

difference(){
	inner();
	outer();
}

difference(){
	nami_plate();
	outer();
}
